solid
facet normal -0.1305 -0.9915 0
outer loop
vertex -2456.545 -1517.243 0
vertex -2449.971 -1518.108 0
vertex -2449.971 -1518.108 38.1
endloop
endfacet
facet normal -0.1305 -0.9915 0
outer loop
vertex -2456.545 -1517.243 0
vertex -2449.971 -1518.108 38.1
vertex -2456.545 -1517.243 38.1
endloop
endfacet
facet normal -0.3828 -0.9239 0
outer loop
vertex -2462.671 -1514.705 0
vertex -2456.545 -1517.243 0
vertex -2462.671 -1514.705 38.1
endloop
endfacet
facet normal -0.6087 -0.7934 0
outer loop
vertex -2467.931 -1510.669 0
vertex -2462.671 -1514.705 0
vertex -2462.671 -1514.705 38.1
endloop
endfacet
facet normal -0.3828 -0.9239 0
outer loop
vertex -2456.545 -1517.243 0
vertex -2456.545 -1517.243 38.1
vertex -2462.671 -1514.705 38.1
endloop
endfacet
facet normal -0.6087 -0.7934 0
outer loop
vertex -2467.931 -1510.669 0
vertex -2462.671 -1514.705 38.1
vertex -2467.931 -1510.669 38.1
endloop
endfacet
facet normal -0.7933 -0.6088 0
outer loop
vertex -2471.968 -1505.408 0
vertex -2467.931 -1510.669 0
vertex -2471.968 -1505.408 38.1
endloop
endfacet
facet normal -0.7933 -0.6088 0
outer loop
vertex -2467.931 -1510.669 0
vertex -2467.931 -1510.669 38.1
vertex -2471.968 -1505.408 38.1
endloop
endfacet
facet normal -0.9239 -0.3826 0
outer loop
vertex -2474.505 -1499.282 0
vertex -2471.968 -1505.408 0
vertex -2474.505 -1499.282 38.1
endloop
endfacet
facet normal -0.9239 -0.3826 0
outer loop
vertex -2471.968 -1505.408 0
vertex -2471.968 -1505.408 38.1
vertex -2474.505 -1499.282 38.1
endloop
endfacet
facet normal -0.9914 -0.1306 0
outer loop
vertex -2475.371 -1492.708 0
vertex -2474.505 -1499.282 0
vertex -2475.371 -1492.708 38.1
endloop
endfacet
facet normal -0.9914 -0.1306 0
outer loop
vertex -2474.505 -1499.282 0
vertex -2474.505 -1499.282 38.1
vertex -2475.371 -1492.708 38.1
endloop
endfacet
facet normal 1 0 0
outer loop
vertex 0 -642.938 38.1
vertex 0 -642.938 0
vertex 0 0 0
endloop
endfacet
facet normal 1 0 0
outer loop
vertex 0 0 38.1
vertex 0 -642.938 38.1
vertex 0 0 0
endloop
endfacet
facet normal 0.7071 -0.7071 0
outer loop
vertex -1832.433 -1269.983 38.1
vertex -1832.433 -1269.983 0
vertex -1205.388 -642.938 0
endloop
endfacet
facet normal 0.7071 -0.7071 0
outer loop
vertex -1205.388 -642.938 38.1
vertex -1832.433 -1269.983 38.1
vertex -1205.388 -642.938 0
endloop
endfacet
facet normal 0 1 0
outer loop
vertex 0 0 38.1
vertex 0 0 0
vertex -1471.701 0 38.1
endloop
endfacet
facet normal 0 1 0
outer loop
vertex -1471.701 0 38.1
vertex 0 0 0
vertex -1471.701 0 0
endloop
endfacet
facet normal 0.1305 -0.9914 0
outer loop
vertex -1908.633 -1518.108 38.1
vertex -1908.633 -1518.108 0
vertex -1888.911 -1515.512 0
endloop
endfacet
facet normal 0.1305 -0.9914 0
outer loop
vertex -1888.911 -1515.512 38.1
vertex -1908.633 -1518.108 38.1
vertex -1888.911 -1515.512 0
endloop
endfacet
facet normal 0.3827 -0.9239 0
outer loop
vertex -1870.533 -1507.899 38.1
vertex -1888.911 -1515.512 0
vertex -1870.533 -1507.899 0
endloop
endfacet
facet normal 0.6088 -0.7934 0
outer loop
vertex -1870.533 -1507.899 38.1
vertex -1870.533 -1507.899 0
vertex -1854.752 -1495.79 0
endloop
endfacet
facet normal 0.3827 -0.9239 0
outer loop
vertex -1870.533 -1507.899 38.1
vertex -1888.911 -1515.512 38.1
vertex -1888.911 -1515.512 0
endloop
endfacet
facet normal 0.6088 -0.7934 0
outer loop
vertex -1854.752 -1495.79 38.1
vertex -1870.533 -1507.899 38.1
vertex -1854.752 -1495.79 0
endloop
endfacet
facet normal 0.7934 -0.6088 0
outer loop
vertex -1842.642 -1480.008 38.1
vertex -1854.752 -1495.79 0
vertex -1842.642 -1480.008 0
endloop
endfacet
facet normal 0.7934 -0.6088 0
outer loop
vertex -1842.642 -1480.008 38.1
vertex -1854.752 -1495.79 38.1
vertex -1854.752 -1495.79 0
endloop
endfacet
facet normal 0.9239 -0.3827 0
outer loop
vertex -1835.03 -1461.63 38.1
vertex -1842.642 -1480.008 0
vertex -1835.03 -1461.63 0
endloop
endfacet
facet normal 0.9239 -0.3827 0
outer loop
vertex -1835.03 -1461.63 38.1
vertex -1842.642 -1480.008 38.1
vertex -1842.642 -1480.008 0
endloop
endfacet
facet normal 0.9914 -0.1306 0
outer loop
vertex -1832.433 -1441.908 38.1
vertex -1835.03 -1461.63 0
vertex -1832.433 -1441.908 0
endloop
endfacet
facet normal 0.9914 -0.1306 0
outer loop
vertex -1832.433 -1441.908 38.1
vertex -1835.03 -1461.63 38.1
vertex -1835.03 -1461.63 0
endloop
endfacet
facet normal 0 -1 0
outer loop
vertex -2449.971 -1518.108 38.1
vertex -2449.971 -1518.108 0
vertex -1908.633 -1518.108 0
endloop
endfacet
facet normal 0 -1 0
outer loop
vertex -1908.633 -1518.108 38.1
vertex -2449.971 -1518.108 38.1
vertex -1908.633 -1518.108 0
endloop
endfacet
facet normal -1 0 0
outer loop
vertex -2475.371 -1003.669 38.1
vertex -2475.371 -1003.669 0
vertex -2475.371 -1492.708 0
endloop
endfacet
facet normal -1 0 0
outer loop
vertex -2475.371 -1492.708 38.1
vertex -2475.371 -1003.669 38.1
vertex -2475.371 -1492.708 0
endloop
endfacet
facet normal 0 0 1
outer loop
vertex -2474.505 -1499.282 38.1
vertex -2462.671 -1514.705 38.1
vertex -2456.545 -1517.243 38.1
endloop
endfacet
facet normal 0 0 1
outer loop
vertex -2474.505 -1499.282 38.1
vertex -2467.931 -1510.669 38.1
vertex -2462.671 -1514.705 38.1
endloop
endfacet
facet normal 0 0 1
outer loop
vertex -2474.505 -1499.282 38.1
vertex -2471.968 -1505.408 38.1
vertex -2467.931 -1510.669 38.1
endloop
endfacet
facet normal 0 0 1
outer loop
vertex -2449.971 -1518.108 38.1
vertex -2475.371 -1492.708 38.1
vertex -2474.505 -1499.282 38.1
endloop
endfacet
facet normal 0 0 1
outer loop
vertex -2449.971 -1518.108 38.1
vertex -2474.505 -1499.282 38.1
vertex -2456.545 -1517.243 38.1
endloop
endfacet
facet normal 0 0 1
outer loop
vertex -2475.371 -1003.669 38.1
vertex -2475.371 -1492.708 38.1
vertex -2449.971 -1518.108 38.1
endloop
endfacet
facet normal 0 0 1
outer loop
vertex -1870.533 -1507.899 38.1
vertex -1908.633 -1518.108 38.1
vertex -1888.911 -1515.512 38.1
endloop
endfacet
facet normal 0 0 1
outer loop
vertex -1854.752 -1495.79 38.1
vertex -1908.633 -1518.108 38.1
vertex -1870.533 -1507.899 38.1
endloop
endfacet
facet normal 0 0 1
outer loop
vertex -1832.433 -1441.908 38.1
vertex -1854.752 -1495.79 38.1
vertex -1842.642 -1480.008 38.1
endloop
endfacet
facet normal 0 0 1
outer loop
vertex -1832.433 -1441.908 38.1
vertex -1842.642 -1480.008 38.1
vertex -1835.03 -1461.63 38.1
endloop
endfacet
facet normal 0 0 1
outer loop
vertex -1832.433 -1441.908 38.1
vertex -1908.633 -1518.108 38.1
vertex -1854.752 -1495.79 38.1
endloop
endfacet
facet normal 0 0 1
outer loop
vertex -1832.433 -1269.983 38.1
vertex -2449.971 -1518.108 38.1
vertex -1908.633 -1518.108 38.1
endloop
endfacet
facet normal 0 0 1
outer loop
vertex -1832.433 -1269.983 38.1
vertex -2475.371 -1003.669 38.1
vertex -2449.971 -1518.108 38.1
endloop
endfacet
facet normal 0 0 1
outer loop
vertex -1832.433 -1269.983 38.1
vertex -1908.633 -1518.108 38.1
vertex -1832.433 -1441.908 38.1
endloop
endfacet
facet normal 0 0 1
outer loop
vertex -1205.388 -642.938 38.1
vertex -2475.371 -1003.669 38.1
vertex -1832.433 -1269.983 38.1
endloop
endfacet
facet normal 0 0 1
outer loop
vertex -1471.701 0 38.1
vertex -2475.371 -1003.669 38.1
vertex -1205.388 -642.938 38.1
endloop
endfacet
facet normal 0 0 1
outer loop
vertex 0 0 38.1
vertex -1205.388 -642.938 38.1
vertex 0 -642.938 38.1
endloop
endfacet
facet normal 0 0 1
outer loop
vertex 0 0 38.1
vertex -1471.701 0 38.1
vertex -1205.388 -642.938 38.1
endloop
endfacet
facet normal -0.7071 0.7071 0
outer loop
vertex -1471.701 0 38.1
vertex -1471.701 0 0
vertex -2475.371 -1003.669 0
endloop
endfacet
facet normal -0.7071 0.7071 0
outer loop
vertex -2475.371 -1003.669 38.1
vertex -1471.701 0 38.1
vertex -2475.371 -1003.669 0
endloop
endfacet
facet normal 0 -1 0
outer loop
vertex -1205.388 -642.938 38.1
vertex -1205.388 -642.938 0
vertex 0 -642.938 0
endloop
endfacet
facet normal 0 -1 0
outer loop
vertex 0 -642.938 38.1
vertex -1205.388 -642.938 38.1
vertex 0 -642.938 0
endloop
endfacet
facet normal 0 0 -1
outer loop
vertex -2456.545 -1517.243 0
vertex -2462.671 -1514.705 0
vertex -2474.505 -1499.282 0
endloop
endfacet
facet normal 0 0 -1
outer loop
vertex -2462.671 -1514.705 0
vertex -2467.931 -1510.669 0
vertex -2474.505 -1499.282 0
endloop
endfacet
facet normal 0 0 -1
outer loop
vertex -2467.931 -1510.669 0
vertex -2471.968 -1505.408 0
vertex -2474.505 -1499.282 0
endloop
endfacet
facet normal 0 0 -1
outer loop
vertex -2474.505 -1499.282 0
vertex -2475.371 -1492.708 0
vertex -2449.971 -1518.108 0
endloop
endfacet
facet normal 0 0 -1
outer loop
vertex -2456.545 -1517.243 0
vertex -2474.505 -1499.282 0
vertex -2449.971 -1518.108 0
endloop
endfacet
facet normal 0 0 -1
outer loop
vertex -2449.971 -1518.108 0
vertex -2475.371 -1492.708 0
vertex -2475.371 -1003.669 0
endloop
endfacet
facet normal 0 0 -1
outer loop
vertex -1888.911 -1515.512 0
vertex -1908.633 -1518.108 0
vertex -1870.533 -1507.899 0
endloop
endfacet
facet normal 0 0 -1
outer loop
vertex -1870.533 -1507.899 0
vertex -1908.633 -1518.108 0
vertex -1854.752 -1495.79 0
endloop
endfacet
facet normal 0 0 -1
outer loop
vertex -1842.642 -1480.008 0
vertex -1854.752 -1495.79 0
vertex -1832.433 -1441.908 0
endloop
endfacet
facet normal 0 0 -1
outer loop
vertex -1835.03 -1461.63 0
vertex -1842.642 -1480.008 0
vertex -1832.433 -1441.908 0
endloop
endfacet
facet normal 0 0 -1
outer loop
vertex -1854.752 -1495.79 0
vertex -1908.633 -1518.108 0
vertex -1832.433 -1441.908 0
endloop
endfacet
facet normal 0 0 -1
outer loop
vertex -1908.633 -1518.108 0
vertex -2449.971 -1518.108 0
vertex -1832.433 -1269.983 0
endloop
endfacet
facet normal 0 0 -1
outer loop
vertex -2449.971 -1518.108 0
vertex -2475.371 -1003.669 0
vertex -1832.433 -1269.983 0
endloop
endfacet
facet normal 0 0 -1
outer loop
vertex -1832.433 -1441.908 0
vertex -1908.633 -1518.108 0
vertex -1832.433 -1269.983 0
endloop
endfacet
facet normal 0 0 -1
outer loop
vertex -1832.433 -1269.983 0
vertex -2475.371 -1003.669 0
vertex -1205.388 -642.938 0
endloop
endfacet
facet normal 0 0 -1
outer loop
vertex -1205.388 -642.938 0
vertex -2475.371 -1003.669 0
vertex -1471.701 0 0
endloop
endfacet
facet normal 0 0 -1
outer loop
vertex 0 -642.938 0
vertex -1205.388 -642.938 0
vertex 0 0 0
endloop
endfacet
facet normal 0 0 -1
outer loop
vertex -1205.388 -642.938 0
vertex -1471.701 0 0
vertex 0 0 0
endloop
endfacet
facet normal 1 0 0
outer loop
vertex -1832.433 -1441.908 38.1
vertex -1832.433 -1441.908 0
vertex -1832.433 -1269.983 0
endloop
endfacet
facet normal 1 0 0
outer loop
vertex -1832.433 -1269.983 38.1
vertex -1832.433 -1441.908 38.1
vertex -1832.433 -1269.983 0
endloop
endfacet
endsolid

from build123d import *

# Parameters (mm, degrees)
F1_DEPTH = 38.1
F2_R     = 76.2
F3_R     = 25.4


with BuildPart() as f1:
    # F0 (on Top) → F1 (new body)
    with BuildSketch(Plane.XY):
        Polygon((0, -642.9375), (0, 0), (-1471.7014, 0), (-2475.370745, -1003.669345), (-2475.370745, -1518.108245), (-1832.433245, -1518.108245), (-1832.433245, -1269.982777), (-1205.387968, -642.9375), align=None)
    extrude(amount=F1_DEPTH)

    # F2
    f2_edges = [f1.edges().sort_by_distance(p)[0] for p in [
        (-1832.433245, -1518.108245, 19.05),
    ]]
    fillet(f2_edges, radius=F2_R)

    # F3
    f3_edges = [f1.edges().sort_by_distance(p)[0] for p in [
        (-2475.370745, -1518.108245, 19.05),
    ]]
    fillet(f3_edges, radius=F3_R)


solid = f1.part
